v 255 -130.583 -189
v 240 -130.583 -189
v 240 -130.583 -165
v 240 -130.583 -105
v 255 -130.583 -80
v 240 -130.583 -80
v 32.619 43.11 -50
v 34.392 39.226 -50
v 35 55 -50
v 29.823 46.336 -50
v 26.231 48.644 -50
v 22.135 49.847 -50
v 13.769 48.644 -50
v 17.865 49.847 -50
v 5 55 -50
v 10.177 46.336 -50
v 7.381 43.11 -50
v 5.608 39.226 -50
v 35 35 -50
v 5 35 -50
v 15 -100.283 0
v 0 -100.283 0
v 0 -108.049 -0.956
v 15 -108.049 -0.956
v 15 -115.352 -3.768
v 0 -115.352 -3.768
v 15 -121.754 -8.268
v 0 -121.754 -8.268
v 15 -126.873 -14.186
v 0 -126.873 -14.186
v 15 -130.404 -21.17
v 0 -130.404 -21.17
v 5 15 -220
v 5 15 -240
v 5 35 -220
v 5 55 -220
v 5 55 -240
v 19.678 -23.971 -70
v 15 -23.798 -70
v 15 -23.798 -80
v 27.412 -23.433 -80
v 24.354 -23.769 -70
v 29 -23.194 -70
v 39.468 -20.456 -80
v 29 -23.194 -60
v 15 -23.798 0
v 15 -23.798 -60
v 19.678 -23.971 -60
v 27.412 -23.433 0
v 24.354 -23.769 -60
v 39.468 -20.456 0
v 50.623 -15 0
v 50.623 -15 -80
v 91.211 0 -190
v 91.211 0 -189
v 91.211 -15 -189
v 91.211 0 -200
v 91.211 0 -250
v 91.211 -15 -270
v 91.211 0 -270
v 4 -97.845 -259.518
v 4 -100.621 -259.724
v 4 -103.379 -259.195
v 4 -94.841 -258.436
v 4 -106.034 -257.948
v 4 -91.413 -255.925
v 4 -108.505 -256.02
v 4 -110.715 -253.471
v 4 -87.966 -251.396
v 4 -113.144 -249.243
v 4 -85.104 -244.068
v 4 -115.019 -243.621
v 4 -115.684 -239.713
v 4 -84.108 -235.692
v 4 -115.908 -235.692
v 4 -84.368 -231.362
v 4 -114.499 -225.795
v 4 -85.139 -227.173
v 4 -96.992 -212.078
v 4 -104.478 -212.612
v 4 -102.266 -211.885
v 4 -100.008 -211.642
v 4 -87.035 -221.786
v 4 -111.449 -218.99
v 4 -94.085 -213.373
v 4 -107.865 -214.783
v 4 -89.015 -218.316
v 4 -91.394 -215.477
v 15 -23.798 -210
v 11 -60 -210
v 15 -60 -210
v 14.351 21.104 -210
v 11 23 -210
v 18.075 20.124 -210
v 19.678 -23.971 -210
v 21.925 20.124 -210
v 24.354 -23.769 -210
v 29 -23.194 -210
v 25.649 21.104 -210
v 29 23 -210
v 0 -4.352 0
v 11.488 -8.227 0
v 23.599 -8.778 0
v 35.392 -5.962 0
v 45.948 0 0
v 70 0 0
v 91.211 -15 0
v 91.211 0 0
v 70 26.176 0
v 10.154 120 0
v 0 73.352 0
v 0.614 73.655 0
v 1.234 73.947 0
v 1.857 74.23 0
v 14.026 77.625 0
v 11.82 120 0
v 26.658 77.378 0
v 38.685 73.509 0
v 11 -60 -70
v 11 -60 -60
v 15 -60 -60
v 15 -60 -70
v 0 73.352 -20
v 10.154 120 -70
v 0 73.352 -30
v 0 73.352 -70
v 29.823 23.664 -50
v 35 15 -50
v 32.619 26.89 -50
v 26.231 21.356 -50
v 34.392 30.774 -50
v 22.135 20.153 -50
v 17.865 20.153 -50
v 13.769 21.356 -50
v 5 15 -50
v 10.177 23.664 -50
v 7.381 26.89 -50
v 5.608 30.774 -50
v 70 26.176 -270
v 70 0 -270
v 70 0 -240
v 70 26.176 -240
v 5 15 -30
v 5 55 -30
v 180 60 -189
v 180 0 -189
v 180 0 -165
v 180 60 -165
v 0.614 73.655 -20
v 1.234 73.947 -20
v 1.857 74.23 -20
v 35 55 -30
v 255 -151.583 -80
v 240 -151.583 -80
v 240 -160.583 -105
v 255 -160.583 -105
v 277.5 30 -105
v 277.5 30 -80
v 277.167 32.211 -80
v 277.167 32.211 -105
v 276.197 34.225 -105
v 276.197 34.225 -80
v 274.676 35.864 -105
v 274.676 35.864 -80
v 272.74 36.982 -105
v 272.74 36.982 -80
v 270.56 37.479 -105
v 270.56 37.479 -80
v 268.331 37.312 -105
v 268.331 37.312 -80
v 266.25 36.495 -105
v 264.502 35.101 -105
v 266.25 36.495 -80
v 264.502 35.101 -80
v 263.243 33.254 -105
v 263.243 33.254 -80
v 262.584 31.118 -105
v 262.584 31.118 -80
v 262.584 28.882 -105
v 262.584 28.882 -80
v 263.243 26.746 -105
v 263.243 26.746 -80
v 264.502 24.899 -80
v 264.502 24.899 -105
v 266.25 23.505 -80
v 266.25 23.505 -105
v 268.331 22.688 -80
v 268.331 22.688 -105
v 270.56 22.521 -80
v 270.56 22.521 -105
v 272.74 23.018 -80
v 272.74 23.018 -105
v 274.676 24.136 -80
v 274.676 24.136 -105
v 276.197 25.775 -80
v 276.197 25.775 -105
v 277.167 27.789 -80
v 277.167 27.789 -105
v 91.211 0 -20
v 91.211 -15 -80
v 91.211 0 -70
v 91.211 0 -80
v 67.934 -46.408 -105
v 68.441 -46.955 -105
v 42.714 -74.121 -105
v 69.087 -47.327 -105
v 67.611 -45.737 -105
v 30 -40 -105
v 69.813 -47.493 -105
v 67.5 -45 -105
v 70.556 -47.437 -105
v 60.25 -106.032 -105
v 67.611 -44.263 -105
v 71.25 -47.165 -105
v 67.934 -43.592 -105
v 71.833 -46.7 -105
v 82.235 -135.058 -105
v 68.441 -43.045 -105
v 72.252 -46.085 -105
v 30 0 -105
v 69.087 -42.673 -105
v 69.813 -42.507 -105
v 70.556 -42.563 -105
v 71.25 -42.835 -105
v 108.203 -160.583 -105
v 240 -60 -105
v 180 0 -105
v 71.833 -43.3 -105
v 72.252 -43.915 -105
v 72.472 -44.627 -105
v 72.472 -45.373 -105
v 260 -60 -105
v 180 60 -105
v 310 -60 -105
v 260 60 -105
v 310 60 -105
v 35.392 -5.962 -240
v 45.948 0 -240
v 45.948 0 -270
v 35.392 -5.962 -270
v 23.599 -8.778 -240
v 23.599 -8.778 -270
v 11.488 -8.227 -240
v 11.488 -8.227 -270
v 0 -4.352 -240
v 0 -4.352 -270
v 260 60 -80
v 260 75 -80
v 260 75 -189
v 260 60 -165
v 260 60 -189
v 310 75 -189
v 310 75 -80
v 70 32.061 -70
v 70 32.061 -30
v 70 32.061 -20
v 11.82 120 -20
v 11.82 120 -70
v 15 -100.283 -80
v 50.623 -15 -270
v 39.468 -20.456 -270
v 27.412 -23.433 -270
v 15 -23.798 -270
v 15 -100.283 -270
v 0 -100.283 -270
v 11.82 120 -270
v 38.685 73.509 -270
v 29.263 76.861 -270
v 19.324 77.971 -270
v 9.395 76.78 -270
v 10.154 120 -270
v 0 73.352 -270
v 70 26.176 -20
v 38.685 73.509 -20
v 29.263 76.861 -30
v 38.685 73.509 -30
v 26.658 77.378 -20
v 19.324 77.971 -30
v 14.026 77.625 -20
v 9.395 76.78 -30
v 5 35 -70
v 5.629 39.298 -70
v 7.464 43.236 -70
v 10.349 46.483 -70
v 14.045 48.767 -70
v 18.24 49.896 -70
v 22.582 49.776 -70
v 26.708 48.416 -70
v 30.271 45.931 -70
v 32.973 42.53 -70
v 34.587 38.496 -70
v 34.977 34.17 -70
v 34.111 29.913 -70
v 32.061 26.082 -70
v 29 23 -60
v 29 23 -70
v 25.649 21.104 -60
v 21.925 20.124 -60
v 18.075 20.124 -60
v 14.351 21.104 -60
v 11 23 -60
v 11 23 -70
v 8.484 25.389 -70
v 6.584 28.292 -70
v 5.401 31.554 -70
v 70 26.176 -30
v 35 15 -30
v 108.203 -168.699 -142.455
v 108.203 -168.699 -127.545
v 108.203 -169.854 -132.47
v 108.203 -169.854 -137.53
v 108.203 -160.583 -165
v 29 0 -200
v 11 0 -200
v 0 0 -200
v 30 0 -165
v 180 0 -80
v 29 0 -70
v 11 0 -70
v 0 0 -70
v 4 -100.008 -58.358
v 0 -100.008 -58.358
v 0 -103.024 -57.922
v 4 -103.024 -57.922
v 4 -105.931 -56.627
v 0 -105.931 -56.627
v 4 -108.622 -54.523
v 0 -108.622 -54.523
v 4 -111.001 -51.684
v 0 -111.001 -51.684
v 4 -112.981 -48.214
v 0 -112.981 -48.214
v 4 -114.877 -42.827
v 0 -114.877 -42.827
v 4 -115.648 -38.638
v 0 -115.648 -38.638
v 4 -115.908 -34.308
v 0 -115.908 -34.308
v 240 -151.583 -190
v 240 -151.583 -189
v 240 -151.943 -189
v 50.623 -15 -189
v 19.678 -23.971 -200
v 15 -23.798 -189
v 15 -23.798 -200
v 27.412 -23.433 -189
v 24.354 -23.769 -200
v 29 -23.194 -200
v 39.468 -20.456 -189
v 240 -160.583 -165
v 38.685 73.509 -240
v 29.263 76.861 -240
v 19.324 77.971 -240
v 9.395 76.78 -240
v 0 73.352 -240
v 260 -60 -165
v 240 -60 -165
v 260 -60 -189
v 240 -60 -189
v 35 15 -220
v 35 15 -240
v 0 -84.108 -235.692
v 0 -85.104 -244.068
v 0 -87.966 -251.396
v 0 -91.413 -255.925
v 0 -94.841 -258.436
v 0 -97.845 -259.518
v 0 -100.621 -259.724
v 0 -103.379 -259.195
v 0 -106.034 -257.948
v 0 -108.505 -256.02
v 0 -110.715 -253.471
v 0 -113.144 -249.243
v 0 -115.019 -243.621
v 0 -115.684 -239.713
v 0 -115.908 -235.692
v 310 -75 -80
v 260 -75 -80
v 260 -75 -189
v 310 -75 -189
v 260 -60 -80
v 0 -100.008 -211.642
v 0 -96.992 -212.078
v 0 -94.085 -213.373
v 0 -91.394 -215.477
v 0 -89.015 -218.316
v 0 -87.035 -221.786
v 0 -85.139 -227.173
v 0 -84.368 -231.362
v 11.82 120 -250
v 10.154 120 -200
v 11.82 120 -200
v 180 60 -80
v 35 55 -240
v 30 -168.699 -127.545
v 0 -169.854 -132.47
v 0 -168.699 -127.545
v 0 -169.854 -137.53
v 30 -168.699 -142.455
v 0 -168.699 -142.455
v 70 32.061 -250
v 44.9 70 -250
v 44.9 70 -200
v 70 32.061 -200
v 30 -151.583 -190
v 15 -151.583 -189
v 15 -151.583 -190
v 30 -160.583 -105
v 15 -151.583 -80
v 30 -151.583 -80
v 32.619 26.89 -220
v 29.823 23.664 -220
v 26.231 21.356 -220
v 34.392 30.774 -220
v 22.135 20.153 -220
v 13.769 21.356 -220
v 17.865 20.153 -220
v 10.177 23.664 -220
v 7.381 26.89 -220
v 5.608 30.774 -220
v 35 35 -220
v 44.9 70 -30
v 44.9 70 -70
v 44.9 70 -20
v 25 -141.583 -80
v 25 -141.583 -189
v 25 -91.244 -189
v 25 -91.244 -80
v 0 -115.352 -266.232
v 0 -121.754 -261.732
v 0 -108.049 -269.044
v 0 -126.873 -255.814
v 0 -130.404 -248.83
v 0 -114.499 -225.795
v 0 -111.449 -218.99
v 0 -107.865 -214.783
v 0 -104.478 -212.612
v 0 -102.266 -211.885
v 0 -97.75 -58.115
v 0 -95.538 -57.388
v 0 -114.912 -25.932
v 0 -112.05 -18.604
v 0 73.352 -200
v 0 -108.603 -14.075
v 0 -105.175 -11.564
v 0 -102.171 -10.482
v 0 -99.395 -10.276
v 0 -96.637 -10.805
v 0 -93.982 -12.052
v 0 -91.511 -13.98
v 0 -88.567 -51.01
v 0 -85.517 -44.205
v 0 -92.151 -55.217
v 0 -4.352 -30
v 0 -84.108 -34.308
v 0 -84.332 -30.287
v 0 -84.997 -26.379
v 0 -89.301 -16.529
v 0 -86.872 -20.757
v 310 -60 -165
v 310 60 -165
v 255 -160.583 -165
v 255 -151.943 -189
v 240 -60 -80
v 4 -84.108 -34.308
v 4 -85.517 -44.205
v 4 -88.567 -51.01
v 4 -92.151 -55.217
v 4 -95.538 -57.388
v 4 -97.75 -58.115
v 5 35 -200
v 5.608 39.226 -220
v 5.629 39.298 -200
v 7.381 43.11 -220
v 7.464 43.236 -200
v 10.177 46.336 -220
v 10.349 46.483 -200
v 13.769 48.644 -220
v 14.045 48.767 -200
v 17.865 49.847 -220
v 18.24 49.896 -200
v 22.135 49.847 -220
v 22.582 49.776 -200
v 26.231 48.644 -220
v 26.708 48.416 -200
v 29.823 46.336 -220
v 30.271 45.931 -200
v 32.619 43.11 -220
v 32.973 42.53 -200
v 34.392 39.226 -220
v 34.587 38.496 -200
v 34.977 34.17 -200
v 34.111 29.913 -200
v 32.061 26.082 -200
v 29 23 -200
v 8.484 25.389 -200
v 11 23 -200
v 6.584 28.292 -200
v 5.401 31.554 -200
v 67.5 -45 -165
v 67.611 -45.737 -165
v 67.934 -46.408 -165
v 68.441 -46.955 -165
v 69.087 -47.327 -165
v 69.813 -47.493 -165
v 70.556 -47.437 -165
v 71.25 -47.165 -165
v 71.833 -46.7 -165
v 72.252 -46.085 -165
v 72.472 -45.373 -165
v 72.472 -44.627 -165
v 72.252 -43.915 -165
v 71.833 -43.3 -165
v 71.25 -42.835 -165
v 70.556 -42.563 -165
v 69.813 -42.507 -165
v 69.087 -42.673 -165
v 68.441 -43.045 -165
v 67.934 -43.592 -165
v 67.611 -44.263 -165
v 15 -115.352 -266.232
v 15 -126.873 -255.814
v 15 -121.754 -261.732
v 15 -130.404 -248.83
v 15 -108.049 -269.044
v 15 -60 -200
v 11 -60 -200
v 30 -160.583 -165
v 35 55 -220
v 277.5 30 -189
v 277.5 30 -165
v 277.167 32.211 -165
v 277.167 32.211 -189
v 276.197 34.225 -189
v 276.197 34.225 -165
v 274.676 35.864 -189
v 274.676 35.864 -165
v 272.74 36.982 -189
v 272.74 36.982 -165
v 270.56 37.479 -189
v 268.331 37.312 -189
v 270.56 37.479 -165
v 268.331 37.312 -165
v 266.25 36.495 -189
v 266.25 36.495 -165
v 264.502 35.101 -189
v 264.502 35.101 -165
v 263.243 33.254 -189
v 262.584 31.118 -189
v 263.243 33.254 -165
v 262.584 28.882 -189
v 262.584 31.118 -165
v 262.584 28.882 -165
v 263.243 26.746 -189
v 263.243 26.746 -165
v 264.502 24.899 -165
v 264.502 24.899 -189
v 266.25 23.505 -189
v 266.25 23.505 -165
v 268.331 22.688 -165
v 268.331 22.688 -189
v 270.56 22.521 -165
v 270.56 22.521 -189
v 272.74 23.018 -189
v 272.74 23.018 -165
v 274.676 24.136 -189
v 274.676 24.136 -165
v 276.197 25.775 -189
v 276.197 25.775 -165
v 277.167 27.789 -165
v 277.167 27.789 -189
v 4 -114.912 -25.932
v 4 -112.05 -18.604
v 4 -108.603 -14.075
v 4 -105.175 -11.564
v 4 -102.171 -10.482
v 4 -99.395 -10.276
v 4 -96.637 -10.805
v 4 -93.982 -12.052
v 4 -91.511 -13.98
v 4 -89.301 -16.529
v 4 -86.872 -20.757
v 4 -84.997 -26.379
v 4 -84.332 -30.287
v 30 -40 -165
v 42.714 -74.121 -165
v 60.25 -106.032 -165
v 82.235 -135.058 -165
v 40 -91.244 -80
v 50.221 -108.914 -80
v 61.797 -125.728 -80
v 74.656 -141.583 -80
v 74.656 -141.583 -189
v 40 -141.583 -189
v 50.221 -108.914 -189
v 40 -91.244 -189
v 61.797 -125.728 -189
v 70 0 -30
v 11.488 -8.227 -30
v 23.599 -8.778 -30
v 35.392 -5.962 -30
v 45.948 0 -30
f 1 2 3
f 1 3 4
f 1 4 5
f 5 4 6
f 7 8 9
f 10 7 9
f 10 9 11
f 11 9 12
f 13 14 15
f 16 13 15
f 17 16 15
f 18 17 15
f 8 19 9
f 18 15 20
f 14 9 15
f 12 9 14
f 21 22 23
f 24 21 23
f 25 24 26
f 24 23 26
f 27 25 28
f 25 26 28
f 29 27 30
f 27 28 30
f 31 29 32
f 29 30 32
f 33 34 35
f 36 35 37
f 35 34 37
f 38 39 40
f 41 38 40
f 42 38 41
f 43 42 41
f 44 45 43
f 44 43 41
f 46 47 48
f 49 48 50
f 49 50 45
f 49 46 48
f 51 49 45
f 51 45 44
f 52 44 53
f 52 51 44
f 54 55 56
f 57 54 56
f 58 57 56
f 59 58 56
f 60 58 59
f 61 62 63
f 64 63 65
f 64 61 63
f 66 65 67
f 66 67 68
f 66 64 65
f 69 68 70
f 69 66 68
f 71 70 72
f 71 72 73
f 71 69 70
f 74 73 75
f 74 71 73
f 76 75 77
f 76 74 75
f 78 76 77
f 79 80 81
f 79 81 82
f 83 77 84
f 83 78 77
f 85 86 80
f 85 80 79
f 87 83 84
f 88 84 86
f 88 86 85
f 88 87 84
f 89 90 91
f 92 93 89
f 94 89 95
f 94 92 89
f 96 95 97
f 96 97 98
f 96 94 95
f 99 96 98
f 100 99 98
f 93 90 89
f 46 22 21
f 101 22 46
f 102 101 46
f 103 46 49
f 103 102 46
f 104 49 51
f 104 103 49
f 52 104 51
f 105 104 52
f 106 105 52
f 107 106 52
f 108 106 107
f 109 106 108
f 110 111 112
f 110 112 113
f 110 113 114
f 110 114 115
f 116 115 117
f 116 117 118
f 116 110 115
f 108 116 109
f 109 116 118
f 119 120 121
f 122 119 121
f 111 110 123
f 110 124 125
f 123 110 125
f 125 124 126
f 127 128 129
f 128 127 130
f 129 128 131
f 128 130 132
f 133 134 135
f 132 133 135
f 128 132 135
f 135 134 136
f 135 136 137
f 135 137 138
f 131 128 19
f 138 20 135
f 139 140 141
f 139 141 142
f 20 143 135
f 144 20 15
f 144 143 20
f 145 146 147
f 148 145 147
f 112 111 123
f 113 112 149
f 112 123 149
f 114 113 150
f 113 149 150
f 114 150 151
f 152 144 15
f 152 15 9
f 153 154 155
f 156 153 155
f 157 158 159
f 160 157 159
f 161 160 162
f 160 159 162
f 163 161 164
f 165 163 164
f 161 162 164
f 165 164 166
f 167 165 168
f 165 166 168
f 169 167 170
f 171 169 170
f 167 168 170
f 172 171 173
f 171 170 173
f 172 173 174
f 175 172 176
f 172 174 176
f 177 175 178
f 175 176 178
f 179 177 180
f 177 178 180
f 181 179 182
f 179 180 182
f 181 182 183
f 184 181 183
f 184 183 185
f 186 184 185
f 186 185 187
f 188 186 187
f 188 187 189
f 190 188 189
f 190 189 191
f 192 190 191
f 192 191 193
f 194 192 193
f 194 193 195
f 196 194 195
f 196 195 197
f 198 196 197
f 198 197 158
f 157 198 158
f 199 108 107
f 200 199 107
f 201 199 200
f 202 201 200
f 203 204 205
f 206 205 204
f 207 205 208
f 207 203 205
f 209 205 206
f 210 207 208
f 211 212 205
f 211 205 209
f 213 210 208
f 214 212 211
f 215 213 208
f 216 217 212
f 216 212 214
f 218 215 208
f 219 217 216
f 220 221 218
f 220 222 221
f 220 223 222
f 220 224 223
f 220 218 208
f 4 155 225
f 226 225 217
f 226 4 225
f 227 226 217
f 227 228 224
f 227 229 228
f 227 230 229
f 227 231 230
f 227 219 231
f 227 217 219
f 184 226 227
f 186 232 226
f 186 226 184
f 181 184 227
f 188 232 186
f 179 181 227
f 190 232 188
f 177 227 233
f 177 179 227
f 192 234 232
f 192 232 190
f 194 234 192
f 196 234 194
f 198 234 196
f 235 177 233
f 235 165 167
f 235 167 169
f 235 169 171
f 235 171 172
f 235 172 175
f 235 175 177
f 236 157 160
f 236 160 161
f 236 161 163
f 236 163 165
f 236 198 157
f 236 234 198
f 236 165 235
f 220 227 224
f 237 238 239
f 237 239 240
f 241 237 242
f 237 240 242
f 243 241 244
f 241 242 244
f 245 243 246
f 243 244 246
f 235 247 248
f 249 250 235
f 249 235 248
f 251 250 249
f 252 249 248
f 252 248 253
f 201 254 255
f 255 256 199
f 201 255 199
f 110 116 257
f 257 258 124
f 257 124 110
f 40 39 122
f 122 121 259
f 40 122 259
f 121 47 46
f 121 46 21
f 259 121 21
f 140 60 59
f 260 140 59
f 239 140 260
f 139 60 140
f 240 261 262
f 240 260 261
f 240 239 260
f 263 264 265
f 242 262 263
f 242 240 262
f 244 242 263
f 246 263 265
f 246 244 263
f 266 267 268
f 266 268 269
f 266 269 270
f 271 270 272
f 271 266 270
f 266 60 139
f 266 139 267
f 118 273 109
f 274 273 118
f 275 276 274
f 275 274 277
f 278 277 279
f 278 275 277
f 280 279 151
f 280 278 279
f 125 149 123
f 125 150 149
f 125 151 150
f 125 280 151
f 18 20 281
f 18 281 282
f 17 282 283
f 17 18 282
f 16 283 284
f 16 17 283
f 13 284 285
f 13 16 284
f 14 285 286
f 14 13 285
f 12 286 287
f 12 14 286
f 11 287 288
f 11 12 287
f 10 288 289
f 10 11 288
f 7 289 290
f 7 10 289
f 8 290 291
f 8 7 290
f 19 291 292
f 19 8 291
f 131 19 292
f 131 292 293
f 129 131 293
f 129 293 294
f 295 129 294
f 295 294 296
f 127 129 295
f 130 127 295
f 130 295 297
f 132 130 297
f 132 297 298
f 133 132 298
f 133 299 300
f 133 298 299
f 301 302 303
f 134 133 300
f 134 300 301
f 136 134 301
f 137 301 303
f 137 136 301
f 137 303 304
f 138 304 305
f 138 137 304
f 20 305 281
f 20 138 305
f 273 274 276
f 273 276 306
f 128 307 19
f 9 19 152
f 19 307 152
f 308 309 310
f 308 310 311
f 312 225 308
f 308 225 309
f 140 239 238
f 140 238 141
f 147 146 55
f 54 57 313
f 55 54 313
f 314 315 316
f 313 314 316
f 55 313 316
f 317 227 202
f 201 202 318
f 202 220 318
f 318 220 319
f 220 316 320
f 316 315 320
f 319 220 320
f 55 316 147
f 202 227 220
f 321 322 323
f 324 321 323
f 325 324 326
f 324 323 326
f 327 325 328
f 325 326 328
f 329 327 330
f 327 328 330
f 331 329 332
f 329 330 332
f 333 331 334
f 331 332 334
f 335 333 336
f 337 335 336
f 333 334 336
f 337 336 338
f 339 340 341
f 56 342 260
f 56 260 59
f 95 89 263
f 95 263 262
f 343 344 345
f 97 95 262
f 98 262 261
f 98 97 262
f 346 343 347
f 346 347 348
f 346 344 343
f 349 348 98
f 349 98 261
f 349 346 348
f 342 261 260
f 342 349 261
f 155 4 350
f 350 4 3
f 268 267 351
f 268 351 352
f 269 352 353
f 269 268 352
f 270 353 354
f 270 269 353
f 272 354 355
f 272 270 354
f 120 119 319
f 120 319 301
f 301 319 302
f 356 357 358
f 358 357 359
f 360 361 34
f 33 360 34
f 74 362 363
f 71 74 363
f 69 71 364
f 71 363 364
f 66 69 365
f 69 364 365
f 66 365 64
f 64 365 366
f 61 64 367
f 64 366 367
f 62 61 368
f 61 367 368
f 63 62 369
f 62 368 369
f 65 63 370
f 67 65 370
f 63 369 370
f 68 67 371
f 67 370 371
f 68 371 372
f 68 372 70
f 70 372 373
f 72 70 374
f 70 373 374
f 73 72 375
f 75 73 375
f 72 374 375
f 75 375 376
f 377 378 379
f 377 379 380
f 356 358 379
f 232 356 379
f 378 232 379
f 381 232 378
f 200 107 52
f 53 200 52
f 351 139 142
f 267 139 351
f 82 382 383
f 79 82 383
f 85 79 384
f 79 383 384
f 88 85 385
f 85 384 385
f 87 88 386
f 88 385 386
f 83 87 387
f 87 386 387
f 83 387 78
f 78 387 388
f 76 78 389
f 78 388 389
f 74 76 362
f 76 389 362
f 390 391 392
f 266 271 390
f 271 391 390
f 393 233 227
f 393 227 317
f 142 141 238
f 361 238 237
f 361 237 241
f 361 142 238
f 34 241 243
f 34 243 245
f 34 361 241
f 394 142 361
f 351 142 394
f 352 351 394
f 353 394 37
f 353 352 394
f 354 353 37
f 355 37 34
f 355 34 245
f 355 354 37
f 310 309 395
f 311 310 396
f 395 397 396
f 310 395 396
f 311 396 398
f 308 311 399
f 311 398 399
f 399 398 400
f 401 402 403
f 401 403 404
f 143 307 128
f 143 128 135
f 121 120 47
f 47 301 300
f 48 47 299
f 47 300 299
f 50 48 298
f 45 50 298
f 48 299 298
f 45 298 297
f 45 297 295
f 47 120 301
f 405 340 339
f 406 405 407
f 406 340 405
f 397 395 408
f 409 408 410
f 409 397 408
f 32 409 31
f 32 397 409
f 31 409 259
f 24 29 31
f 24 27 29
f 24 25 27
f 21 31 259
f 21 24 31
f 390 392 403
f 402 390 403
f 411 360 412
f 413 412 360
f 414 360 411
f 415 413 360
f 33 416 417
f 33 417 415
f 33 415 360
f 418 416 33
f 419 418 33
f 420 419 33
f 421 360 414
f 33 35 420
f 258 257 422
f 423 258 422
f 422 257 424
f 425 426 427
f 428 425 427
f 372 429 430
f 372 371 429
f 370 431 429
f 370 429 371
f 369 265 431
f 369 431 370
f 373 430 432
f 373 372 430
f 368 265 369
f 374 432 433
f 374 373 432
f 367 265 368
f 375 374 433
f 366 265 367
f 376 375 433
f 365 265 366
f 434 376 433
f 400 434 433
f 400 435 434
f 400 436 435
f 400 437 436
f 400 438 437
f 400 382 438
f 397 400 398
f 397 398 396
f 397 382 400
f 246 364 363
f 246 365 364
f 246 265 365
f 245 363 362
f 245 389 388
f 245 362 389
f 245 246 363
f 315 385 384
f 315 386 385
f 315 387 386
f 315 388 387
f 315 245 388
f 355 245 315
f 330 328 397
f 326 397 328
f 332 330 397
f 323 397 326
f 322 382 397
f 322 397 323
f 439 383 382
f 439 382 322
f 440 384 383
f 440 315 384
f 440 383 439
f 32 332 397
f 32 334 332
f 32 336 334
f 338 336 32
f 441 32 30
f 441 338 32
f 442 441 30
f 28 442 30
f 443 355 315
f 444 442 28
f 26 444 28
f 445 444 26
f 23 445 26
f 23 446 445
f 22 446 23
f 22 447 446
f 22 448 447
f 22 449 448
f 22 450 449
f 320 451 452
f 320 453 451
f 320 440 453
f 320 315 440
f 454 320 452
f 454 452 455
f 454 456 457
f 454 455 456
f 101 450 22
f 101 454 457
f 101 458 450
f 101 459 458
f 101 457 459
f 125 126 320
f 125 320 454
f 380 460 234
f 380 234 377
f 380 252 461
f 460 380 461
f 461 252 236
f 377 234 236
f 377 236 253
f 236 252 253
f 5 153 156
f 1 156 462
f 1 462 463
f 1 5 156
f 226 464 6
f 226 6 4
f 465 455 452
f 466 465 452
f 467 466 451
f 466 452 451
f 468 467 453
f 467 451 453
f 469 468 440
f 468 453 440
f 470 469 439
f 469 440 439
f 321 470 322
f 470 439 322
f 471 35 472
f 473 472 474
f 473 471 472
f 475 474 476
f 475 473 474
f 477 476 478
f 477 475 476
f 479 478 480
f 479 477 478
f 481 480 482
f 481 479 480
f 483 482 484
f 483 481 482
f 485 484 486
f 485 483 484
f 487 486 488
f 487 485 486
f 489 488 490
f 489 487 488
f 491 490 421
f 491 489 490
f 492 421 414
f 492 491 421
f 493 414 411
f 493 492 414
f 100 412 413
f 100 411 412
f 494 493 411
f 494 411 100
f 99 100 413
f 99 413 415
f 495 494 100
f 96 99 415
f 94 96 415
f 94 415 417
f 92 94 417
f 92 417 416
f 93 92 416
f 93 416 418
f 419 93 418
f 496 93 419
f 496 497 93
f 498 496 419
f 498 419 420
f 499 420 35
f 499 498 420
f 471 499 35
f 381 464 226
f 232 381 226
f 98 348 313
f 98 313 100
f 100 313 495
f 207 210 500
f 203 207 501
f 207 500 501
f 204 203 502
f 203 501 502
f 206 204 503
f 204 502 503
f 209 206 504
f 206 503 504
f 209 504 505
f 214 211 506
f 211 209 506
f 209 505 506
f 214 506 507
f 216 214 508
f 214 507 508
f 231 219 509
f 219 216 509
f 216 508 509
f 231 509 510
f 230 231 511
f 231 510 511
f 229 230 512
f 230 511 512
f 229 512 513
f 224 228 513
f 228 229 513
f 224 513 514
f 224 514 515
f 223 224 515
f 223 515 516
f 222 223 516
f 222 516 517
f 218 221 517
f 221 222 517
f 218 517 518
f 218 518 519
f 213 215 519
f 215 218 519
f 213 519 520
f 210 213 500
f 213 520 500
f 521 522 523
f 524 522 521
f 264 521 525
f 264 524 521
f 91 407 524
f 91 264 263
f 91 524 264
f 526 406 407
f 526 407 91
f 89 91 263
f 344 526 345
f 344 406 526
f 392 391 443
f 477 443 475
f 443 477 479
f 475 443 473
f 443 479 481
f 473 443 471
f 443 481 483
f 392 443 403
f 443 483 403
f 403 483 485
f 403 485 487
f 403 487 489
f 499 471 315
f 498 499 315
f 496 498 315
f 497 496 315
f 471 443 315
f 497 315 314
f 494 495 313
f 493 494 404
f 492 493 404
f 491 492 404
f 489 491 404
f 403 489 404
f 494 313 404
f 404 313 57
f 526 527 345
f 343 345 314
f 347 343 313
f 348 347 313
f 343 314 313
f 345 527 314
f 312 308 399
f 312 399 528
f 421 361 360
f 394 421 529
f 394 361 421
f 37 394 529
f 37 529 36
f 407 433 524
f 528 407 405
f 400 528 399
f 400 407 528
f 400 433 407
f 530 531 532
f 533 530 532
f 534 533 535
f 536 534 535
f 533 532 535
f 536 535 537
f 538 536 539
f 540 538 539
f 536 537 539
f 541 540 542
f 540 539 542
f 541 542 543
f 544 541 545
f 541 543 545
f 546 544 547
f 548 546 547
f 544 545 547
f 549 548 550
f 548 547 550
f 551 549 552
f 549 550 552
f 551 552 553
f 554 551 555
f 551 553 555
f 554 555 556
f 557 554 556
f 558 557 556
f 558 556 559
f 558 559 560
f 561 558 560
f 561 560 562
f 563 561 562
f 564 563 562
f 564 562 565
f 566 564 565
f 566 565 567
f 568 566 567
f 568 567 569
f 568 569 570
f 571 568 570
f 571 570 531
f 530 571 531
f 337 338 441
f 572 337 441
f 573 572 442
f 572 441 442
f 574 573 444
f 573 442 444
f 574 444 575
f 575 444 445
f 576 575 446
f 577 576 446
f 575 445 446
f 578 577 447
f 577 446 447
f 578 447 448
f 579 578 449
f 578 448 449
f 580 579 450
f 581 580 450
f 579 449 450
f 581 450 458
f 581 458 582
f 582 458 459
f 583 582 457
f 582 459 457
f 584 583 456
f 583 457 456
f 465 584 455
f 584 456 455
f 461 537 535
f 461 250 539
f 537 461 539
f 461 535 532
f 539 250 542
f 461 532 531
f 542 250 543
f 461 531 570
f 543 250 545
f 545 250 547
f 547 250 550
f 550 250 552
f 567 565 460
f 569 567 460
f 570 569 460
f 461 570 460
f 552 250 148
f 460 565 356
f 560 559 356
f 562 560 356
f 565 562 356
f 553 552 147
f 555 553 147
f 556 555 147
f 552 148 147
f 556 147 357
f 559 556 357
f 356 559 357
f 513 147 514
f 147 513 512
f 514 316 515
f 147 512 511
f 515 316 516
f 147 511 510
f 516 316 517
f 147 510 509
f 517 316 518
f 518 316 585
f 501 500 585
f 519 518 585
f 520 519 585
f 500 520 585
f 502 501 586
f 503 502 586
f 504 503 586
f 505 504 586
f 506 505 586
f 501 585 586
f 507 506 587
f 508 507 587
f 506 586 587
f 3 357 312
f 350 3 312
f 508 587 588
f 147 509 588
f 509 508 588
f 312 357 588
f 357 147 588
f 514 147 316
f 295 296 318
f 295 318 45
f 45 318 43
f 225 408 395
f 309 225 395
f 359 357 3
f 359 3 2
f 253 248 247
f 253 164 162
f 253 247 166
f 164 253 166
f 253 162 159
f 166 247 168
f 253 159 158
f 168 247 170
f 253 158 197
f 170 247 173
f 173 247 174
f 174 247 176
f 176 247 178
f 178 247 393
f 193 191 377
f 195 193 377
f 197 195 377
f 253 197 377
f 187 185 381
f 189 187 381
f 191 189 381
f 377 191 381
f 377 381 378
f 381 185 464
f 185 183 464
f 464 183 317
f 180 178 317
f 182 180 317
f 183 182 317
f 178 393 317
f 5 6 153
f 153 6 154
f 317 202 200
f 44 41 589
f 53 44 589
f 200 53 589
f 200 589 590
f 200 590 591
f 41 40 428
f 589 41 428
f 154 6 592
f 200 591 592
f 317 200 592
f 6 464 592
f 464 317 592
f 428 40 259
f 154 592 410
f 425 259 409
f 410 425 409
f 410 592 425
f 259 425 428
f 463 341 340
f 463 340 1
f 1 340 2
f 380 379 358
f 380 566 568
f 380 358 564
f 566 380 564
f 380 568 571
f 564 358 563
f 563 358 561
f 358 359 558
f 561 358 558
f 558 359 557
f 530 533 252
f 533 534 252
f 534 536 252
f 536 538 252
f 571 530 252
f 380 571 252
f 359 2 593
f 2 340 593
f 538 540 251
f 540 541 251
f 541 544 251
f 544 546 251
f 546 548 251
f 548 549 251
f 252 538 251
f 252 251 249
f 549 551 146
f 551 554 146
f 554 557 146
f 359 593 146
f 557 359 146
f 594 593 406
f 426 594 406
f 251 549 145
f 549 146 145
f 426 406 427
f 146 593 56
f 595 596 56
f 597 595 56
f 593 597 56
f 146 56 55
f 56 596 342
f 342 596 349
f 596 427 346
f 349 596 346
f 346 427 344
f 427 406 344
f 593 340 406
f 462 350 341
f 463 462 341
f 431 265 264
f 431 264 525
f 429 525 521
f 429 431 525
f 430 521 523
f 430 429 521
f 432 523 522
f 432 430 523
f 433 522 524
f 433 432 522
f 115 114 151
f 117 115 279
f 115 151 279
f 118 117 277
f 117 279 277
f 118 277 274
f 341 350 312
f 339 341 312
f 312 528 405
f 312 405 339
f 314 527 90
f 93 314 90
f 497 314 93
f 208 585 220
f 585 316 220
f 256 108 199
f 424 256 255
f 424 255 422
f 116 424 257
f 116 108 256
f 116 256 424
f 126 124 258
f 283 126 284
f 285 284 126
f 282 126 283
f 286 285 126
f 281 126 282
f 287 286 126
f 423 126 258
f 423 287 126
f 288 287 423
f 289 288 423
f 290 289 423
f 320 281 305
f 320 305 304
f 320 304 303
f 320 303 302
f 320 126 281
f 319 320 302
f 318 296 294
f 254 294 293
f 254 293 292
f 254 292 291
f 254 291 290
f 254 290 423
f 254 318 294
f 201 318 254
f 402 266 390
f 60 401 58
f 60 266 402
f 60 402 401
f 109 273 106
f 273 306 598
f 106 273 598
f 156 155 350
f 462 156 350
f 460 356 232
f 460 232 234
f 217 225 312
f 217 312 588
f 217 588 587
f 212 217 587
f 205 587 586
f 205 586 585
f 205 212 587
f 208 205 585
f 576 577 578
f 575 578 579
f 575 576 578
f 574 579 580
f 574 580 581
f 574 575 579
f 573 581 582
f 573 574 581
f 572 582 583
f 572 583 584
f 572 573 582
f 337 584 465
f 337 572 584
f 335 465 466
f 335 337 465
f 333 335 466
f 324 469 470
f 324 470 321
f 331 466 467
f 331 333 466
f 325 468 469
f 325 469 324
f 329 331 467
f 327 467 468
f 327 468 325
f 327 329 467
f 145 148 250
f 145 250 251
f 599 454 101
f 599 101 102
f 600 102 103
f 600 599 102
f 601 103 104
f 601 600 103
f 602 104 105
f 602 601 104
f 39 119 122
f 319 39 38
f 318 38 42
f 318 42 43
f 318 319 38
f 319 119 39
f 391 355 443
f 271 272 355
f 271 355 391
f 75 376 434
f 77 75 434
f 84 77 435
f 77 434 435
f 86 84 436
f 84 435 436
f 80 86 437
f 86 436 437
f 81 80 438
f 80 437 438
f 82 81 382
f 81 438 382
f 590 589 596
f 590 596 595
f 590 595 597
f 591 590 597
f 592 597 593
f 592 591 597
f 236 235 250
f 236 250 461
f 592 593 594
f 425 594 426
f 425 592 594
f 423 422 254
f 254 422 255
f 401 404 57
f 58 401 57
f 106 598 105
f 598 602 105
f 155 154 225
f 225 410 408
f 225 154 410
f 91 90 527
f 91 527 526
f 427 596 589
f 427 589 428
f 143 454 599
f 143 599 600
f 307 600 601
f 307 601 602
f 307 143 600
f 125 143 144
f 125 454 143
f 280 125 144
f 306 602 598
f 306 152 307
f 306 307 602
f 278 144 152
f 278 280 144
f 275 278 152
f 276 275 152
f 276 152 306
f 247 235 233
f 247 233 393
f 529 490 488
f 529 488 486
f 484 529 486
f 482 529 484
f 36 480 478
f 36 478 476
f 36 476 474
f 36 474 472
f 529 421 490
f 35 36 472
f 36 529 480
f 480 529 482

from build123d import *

# Parameters (mm, degrees)
EXTRUDE_1_DEPTH           = 30
EXTRUDE_2_DEPTH           = 210
SKETCH_8_W                = 25
SKETCH_8_H                = 120
EXTRUDE_5_DEPTH           = 70
SKETCH_9_W                = 25
SKETCH_9_H                = 60
EXTRUDE_6_DEPTH           = 60
SKETCH_10_R               = 7.5
CUT_EXTRUDE_3_DEPTH       = 402.372644808
EXTRUDE_7_DEPTH           = 60
EXTRUDE_8_REACH           = 392.16
SKETCH_12_R               = 2.5
SKETCH_14_W               = 125
SKETCH_14_H               = 50
EXTRUDE_9_DEPTH           = 120
SKETCH_15_W               = 70
SKETCH_15_H               = 70
CUT_EXTRUDE_4_DEPTH       = 10
CUT_EXTRUDE_5_DEPTH       = 20
SKETCH_17_R               = 43.471266984
CUT_EXTRUDE_6_DEPTH       = 428.317212384
EXTRUDE_10_DEPTH          = 20
EXTRUDE_11_DEPTH          = 20
CUT_EXTRUDE_7_DEPTH       = 434.012701892
CUT_EXTRUDE_8_DEPTH       = 434.012701892
EXTRUDE_19_REACH          = 446.86
EXTRUDE_20_DEPTH          = 20
EXTRUDE_21_DEPTH          = 20
EXTRUDE_START             = 20
EXTRUDE_22_DEPTH          = 20
CUT_EXTRUDE_9_DEPTH       = 30
CUT_EXTRUDE_11_DEPTH      = 407.201920232
CUT_EXTRUDE_11_DEPTH_BACK = 407.201920232
SKETCH_29_R               = 15
EXTRUDE_23_DEPTH          = 78.20324
SKETCH_33_W               = 30
SKETCH_33_H               = 40
CUT_EXTRUDE_14_DEPTH      = 20
SKETCH_34_W               = 18
SKETCH_34_H               = 35.300600551
CUT_EXTRUDE_15_DEPTH      = 10
CUT_EXTRUDE_16_DEPTH      = 10
SKETCH_36_RX              = 24.05
SKETCH_36_RY              = 15.9
SKETCH_36_R               = 15.9
CUT_EXTRUDE_17_DEPTH      = 4
SKETCH_37_W               = 148.788525811
SKETCH_37_H               = 80
CUT_EXTRUDE_18_DEPTH      = 445.859528391
SKETCH_38_W               = 76.211474189
SKETCH_38_H               = 51.3
CUT_EXTRUDE_20_DEPTH      = 80
CUT_EXTRUDE_START         = -81
CUT_EXTRUDE_21_DEPTH      = 81
CUT_EXTRUDE_22_DEPTH      = 402.372644808
SKETCH_41_W               = 18
SKETCH_41_H               = 10
CUT_EXTRUDE_23_DEPTH      = 60
SKETCH_44_W               = 50
SKETCH_44_H               = 109
EXTRUDE_26_DEPTH          = 15
SKETCH_45_W               = 50
SKETCH_45_H               = 109
EXTRUDE_27_DEPTH          = 15
EXTRUDE_28_DEPTH          = 15
SKETCH_47_W               = 15
SKETCH_47_H               = 50.339258453
CUT_EXTRUDE_24_DEPTH      = 109


with BuildPart() as part:
    # 草图1 → 凸台-拉伸1 (new body)
    with BuildSketch(Plane(origin=(0, 0, 0), x_dir=(0, 0, -1), z_dir=(1, 0, 0))):
        with BuildLine():
            Line((0, 0), (270, 0))
            Line((270, 0), (270, -100.282814983))
            ThreePointArc((270, -100.282814983), (264.178138298, -118.691056762), (248.830033233, -130.404003019))
            Line((248.830033233, -130.404003019), (142.45524498, -168.69892679))
            ThreePointArc((142.45524498, -168.69892679), (135, -170), (127.54475502, -168.69892679))
            Line((127.54475502, -168.69892679), (21.169966767, -130.404003019))
            ThreePointArc((21.169966767, -130.404003019), (5.821861702, -118.691056762), (0, -100.282814983))
            Line((0, -100.282814983), (0, 0))
        make_face()
    extrude(amount=EXTRUDE_1_DEPTH)

    # 草图2 → 凸台-拉伸2 (add)
    with BuildSketch(Plane(origin=(30, 0, 0), x_dir=(0, 0, -1), z_dir=(1, 0, 0))):
        with BuildLine():
            Line((105, -160.582814983), (105, 0))
            Line((105, 0), (0, 0))
            Line((0, 0), (0, -100.282814983))
            ThreePointArc((0, -100.282814983), (5.821861702, -118.691056762), (21.169966767, -130.404003019))
            Line((21.169966767, -130.404003019), (105, -160.582814983))
        make_face()
        with BuildLine():
            Line((270, 0), (165, 0))
            Line((165, 0), (165, -160.582814983))
            Line((165, -160.582814983), (248.830033233, -130.404003019))
            ThreePointArc((248.830033233, -130.404003019), (264.178138298, -118.691056762), (270, -100.282814983))
            Line((270, -100.282814983), (270, 0))
        make_face()
    extrude(amount=EXTRUDE_2_DEPTH)

    # 草图8 → 凸台-拉伸5 (add)
    with BuildSketch(Plane(origin=(240, 0, 0), x_dir=(0, 0, -1), z_dir=(1, 0, 0))):
        with Locations((92.5, 0)):
            Rectangle(SKETCH_8_W, SKETCH_8_H)
        with Locations((177.5, 0)):
            Rectangle(SKETCH_8_W, SKETCH_8_H)
    extrude(amount=EXTRUDE_5_DEPTH)

    # 草图9 → 凸台-拉伸6 (add)
    with BuildSketch(Plane.ZY.offset(-240)):
        with Locations((-92.5, 30)):
            Rectangle(SKETCH_9_W, SKETCH_9_H)
        with Locations((-177.5, 30)):
            Rectangle(SKETCH_9_W, SKETCH_9_H)
    extrude(amount=EXTRUDE_6_DEPTH)

    # 草图10 → 切除-拉伸3 (cut, through all)
    with BuildSketch(Plane.XY.offset(-80)):
        with Locations((270, 30)):
            Circle(SKETCH_10_R)
    extrude(amount=-CUT_EXTRUDE_3_DEPTH, mode=Mode.SUBTRACT)

    # 草图11 → 凸台-拉伸7 (add)
    with BuildSketch(Plane(origin=(0, 0, -105), x_dir=(-1, 0, 0), z_dir=(0, 0, -1))):
        with BuildLine():
            Line((-30, -40), (-30, -160.582814983))
            Line((-30, -160.582814983), (-108.203242822, -160.582814983))
            ThreePointArc((-108.203242822, -160.582814983), (-60.24964282, -106.032303748), (-30, -40))
        make_face()
    extrude(amount=EXTRUDE_7_DEPTH)

    # 草图12 → 凸台-拉伸8 (add, up to next)
    with BuildSketch(Plane.XY.offset(-165), mode=Mode.PRIVATE) as extrude_8_sk1:
        with Locations(Location((70, -45, 0), (0, 0, 180))):
            Circle(SKETCH_12_R)
    extrude_8_tool1 = extrude(extrude_8_sk1.sketch, amount=EXTRUDE_8_REACH, mode=Mode.PRIVATE) - part.part
    add(extrude_8_tool1.solids().sort_by_distance((70, -45, -165))[0])

    # 草图14 → 凸台-拉伸9 (add)
    with BuildSketch(Plane(origin=(0, 0, 0), x_dir=(1, 0, 0), z_dir=(0, 1, 0))):
        with Locations((62.5, 225)):
            Rectangle(SKETCH_14_W, SKETCH_14_H)
        with Locations((62.5, 45)):
            Rectangle(SKETCH_14_W, SKETCH_14_H)
    extrude(amount=EXTRUDE_9_DEPTH)

    # 草图15 → 切除-拉伸4 (cut)
    with BuildSketch(Plane.XY.offset(-20)):
        with Locations((35, 35)):
            Rectangle(SKETCH_15_W, SKETCH_15_H)
    extrude(amount=-CUT_EXTRUDE_4_DEPTH, mode=Mode.SUBTRACT)

    # 草图16 → 切除-拉伸5 (cut)
    with BuildSketch(Plane.XY.offset(-30)):
        Polygon((35, 15), (5, 15), (5, 55), (35, 55), (35, 35), align=None)
    extrude(amount=-CUT_EXTRUDE_5_DEPTH, mode=Mode.SUBTRACT)

    # 草图17 → 切除-拉伸6 (cut, through all)
    with BuildSketch(Plane.XY.offset(-30)):
        with Locations((19.5, 34.5)):
            Circle(SKETCH_17_R)
    extrude(amount=CUT_EXTRUDE_6_DEPTH, mode=Mode.SUBTRACT)

    # 草图18 → 凸台-拉伸10 (add)
    with BuildSketch(Plane.XY.offset(-20)):
        Polygon((11.819921283, 120), (91.211474189, 0), (87.317867735, 0), (10.741661946, 115.744614613), align=None)
    extrude(amount=EXTRUDE_10_DEPTH)

    # 草图19 → 凸台-拉伸11 (add)
    with BuildSketch(Plane.XY.offset(-20)):
        with BuildLine():
            Line((1.857343832, 74.230186717), (10.856035233, 115.571739869))
            Line((10.856035233, 115.571739869), (10.741661946, 115.744614613))
            Line((10.741661946, 115.744614613), (11.819921283, 120))
            Line((11.819921283, 120), (10.153664863, 120))
            Line((10.153664863, 120), (0, 73.352297914))
            ThreePointArc((0, 73.352297914), (0.923485284, 73.80221564), (1.857343832, 74.230186717))
        make_face()
    extrude(amount=EXTRUDE_11_DEPTH)

    # 草图20 → 切除-拉伸7 (cut, through all)
    with BuildSketch(Plane.XY.offset(-20)):
        Polygon((0, 120), (0, 73.352297914), (10.153664863, 120), align=None)
    extrude(amount=-CUT_EXTRUDE_7_DEPTH, mode=Mode.SUBTRACT)

    # 草图22 → 切除-拉伸8 (cut, through all)
    with BuildSketch(Plane.XY.offset(-20)):
        Polygon((44.899734993, 70), (70, 32.061054476), (91.211474189, 0), (125, 0), (125, 120), (11.819921283, 120), align=None)
    extrude(amount=-CUT_EXTRUDE_8_DEPTH, mode=Mode.SUBTRACT)

    # 草图23 → 凸台-拉伸19 (add, up to next)
    with BuildSketch(Plane.XY, mode=Mode.PRIVATE) as extrude_19_sk1:
        with BuildLine():
            Line((87.317867735, 0), (91.211474189, 0))
            Line((91.211474189, 0), (11.819921283, 120))
            Line((11.819921283, 120), (10.153664863, 120))
            Line((10.153664863, 120), (0, 73.352297914))
            ThreePointArc((0, 73.352297914), (0.923485284, 73.80221564), (1.857343832, 74.230186717))
            Line((1.857343832, 74.230186717), (10.856035233, 115.571739869))
            Line((10.856035233, 115.571739869), (87.317867735, 0))
        make_face()
    extrude_19_tool1 = extrude(extrude_19_sk1.sketch, amount=-EXTRUDE_19_REACH, mode=Mode.PRIVATE) - part.part
    add(extrude_19_tool1.solids().sort_by_distance((89.264671, 1.5073, 0))[0])

    # 草图24 → 凸台-拉伸20 (add)
    with BuildSketch(Plane.XY.offset(-20)):
        Polygon((87.317867735, 0), (70, 26.175884614), (70, 0), align=None)
    extrude(amount=EXTRUDE_20_DEPTH)

    # 草图25 → 凸台-拉伸21 (add)
    with BuildSketch(Plane.XY.offset(-20)):
        with BuildLine():
            Line((38.684579851, 73.509011127), (10.856035233, 115.571739869))
            Line((10.856035233, 115.571739869), (1.857343832, 74.230186717))
            ThreePointArc((1.857343832, 74.230186717), (20.351120273, 77.962934179), (38.684579851, 73.509011127))
        make_face()
    extrude(amount=EXTRUDE_21_DEPTH)

    # 草图26 → 凸台-拉伸22 (add)
    with BuildSketch(Plane(origin=(0, 0, -250), x_dir=(-1, 0, 0), z_dir=(0, 0, -1)).offset(EXTRUDE_START)):
        with BuildLine():
            Line((-70, 26.175884614), (-38.684579851, 73.509011127))
            ThreePointArc((-38.684579851, 73.509011127), (-19.323897117, 77.970910285), (0, 73.352297914))
            Line((0, 73.352297914), (-10.153664863, 120))
            Line((-10.153664863, 120), (-11.819921283, 120))
            Line((-11.819921283, 120), (-91.211474189, 0))
            Line((-91.211474189, 0), (-240, 0))
            Line((-240, 0), (-240, -100.282814983))
            Line((-240, -100.282814983), (0, -100.282814983))
            Line((0, -100.282814983), (0, -4.352297914))
            ThreePointArc((0, -4.352297914), (-23.599339693, -8.77755154), (-45.948082222, 0))
            Line((-45.948082222, 0), (-70, 0))
            Line((-70, 0), (-70, 26.175884614))
        make_face()
    extrude(amount=-EXTRUDE_22_DEPTH)

    # 草图27 → 切除-拉伸9 (cut)
    with BuildSketch(Plane(origin=(0, 0, -270), x_dir=(-1, 0, 0), z_dir=(0, 0, -1))):
        with BuildLine():
            Line((-38.684579851, 73.509011127), (-70, 26.175884614))
            Line((-70, 26.175884614), (-70, 0))
            Line((-70, 0), (-45.948082222, 0))
            ThreePointArc((-45.948082222, 0), (-23.599339693, -8.77755154), (0, -4.352297914))
            Line((0, -4.352297914), (0, 73.352297914))
            ThreePointArc((0, 73.352297914), (-19.323897117, 77.970910285), (-38.684579851, 73.509011127))
        make_face()
    extrude(amount=-CUT_EXTRUDE_9_DEPTH, mode=Mode.SUBTRACT)

    # 草图29 → 切除-拉伸11 (cut, two sides: drawn at the far end of the back side and taken through both)
    with BuildSketch(Plane(origin=(0, 0, -70), x_dir=(-1, 0, 0), z_dir=(0, 0, -1)).offset(-CUT_EXTRUDE_11_DEPTH_BACK)):
        with Locations((-20, 35)):
            Circle(SKETCH_29_R)
    extrude(amount=CUT_EXTRUDE_11_DEPTH + CUT_EXTRUDE_11_DEPTH_BACK, mode=Mode.SUBTRACT)

    # 草图30 → 凸台-拉伸23 (add)
    with BuildSketch(Plane(origin=(30, 0, 0), x_dir=(0, 0, -1), z_dir=(1, 0, 0))):
        with BuildLine():
            Line((142.45524498, -168.69892679), (165, -160.582814983))
            Line((165, -160.582814983), (105, -160.582814983))
            Line((105, -160.582814983), (127.54475502, -168.69892679))
            ThreePointArc((127.54475502, -168.69892679), (135, -170), (142.45524498, -168.69892679))
        make_face()
    extrude(amount=EXTRUDE_23_DEPTH)

    # 草图33 → 切除-拉伸14 (cut)
    with BuildSketch(Plane(origin=(0, 0, -240), x_dir=(-1, 0, 0), z_dir=(0, 0, -1))):
        with Locations((-20, 35)):
            Rectangle(SKETCH_33_W, SKETCH_33_H)
    extrude(amount=-CUT_EXTRUDE_14_DEPTH, mode=Mode.SUBTRACT)

    # 草图34 → 切除-拉伸15 (cut)
    with BuildSketch(Plane.XY.offset(-200)):
        with Locations((20, 17.650300276)):
            Rectangle(SKETCH_34_W, SKETCH_34_H)
    extrude(amount=-CUT_EXTRUDE_15_DEPTH, mode=Mode.SUBTRACT)

    # 草图35 → 切除-拉伸16 (cut)
    with BuildSketch(Plane(origin=(0, 0, -70), x_dir=(-1, 0, 0), z_dir=(0, 0, -1))):
        with BuildLine():
            Line((-11, 0), (-11, 23))
            ThreePointArc((-11, 23), (-20, 20), (-29, 23))
            Line((-29, 23), (-29, 0))
            Line((-29, 0), (-11, 0))
        make_face()
    extrude(amount=-CUT_EXTRUDE_16_DEPTH, mode=Mode.SUBTRACT)

    # 草图36 → 切除-拉伸17 (cut)
    # profile 1 of 6: a face of its own
    with BuildSketch(Plane.ZY):
        with Locations((-235.69166945, -100.008005659)):
            Ellipse(SKETCH_36_RX, SKETCH_36_RY)
        with Locations((-235.69166945, -100.008005659)):
            Circle(SKETCH_36_R, mode=Mode.SUBTRACT)
    # profile 2 of 6: a face of its own
    with BuildSketch(Plane.ZY):
        with Locations((-235.69166945, -100.008005659)):
            Ellipse(SKETCH_36_RX, SKETCH_36_RY)
        with Locations((-235.69166945, -100.008005659)):
            Circle(SKETCH_36_R, mode=Mode.SUBTRACT)
    # profile 3 of 6: a face of its own
    with BuildSketch(Plane.ZY):
        with Locations((-235.69166945, -100.008005659)):
            Circle(SKETCH_36_R)
    # profile 4 of 6: a face of its own
    with BuildSketch(Plane.ZY):
        with Locations(Location((-34.30833055, -100.008005659), (0, 0, 180))):
            Ellipse(SKETCH_36_RX, SKETCH_36_RY)
        with Locations((-34.30833055, -100.008005659)):
            Circle(SKETCH_36_R, mode=Mode.SUBTRACT)
    # profile 5 of 6: a face of its own
    with BuildSketch(Plane.ZY):
        with Locations(Location((-34.30833055, -100.008005659), (0, 0, 180))):
            Ellipse(SKETCH_36_RX, SKETCH_36_RY)
        with Locations((-34.30833055, -100.008005659)):
            Circle(SKETCH_36_R, mode=Mode.SUBTRACT)
    # profile 6 of 6: a face of its own
    with BuildSketch(Plane.ZY):
        with Locations((-34.30833055, -100.008005659)):
            Circle(SKETCH_36_R)
    extrude(amount=-CUT_EXTRUDE_17_DEPTH, mode=Mode.SUBTRACT)

    # 草图37 → 切除-拉伸18 (cut, through all)
    with BuildSketch(Plane(origin=(0, 0, 0), x_dir=(1, 0, 0), z_dir=(0, 1, 0))):
        with Locations((165.605737095, 40)):
            Rectangle(SKETCH_37_W, SKETCH_37_H)
        with Locations((165.605737095, 230)):
            Rectangle(SKETCH_37_W, SKETCH_37_H)
    extrude(amount=-CUT_EXTRUDE_18_DEPTH, mode=Mode.SUBTRACT)

    # 草图38 → 切除-拉伸20 (cut)
    with BuildSketch(Plane.XY):
        with Locations((53.105737095, -125.932814983)):
            Rectangle(SKETCH_38_W, SKETCH_38_H)
        Polygon((91.211474189, -15), (76.211474189, -15), (76.211474189, -85.282814983), (15, -85.282814983), (15, -100.282814983), (91.211474189, -100.282814983), align=None)
        with BuildLine():
            ThreePointArc((15, -23.79784784), (33.51949079, -22.265684535), (50.622966805, -15))
            Line((50.622966805, -15), (70, -15))
            Line((70, -15), (76.211474189, -15))
            Line((76.211474189, -15), (76.211474189, -85.282814983))
            Line((76.211474189, -85.282814983), (15, -85.282814983))
            Line((15, -85.282814983), (15, -23.79784784))
        make_face()
    extrude(amount=-CUT_EXTRUDE_20_DEPTH, mode=Mode.SUBTRACT)

    # 草图39 → 切除-拉伸21 (cut)
    with BuildSketch(Plane(origin=(0, 0, -270), x_dir=(-1, 0, 0), z_dir=(0, 0, -1)).offset(CUT_EXTRUDE_START)):
        with BuildLine():
            Line((-180, 60), (-310, 60))
            Line((-310, 60), (-310, -60))
            Line((-310, -60), (-240, -60))
            Line((-240, -60), (-240, -151.582814983))
            Line((-240, -151.582814983), (-15, -151.582814983))
            Line((-15, -151.582814983), (-15, -23.79784784))
            ThreePointArc((-15, -23.79784784), (-33.51949079, -22.265684535), (-50.622966805, -15))
            Line((-50.622966805, -15), (-91.211474189, -15))
            Line((-91.211474189, -15), (-91.211474189, 0))
            Line((-91.211474189, 0), (-180, 0))
            Line((-180, 0), (-180, 60))
        make_face()
    extrude(amount=CUT_EXTRUDE_21_DEPTH, mode=Mode.SUBTRACT)

    # 草图40 → 切除-拉伸22 (cut, through all)
    with BuildSketch(Plane.XY.offset(-80)):
        with BuildLine():
            Line((74.655848302, -141.582814983), (40, -141.582814983))
            Line((40, -141.582814983), (40, -91.24355653))
            ThreePointArc((40, -91.24355653), (55.843697078, -117.43499557), (74.655848302, -141.582814983))
        make_face()
    extrude(amount=-CUT_EXTRUDE_22_DEPTH, mode=Mode.SUBTRACT)

    # 草图41 → 切除-拉伸23 (cut)
    with BuildSketch(Plane(origin=(0, 0, 0), x_dir=(1, 0, 0), z_dir=(0, 1, 0))):
        with Locations((20, 65)):
            Rectangle(SKETCH_41_W, SKETCH_41_H)
        with Locations((20, 205)):
            Rectangle(SKETCH_41_W, SKETCH_41_H)
    extrude(amount=-CUT_EXTRUDE_23_DEPTH, mode=Mode.SUBTRACT)

    # 草图44 → 凸台-拉伸26 (add)
    with BuildSketch(Plane(origin=(0, 60, 0), x_dir=(1, 0, 0), z_dir=(0, 1, 0))):
        with Locations((285, 134.5)):
            Rectangle(SKETCH_44_W, SKETCH_44_H)
    extrude(amount=EXTRUDE_26_DEPTH)

    # 草图45 → 凸台-拉伸27 (add)
    with BuildSketch(Plane.XZ.offset(60)):
        with Locations((285, -134.5)):
            Rectangle(SKETCH_45_W, SKETCH_45_H)
    extrude(amount=EXTRUDE_27_DEPTH)

    # 草图46 → 凸台-拉伸28 (add)
    with BuildSketch(Plane(origin=(240, 0, 0), x_dir=(0, 0, -1), z_dir=(1, 0, 0))):
        Polygon((80, -151.582814983), (105, -160.582814983), (165, -160.582814983), (189, -151.942814983), (189, -130.582814983), (80, -130.582814983), align=None)
    extrude(amount=EXTRUDE_28_DEPTH)

    # 草图47 → 切除-拉伸24 (cut)
    with BuildSketch(Plane(origin=(0, 0, -189), x_dir=(-1, 0, 0), z_dir=(0, 0, -1))):
        with Locations((-32.5, -116.413185757)):
            Rectangle(SKETCH_47_W, SKETCH_47_H)
    extrude(amount=-CUT_EXTRUDE_24_DEPTH, mode=Mode.SUBTRACT)


solid = part.part
